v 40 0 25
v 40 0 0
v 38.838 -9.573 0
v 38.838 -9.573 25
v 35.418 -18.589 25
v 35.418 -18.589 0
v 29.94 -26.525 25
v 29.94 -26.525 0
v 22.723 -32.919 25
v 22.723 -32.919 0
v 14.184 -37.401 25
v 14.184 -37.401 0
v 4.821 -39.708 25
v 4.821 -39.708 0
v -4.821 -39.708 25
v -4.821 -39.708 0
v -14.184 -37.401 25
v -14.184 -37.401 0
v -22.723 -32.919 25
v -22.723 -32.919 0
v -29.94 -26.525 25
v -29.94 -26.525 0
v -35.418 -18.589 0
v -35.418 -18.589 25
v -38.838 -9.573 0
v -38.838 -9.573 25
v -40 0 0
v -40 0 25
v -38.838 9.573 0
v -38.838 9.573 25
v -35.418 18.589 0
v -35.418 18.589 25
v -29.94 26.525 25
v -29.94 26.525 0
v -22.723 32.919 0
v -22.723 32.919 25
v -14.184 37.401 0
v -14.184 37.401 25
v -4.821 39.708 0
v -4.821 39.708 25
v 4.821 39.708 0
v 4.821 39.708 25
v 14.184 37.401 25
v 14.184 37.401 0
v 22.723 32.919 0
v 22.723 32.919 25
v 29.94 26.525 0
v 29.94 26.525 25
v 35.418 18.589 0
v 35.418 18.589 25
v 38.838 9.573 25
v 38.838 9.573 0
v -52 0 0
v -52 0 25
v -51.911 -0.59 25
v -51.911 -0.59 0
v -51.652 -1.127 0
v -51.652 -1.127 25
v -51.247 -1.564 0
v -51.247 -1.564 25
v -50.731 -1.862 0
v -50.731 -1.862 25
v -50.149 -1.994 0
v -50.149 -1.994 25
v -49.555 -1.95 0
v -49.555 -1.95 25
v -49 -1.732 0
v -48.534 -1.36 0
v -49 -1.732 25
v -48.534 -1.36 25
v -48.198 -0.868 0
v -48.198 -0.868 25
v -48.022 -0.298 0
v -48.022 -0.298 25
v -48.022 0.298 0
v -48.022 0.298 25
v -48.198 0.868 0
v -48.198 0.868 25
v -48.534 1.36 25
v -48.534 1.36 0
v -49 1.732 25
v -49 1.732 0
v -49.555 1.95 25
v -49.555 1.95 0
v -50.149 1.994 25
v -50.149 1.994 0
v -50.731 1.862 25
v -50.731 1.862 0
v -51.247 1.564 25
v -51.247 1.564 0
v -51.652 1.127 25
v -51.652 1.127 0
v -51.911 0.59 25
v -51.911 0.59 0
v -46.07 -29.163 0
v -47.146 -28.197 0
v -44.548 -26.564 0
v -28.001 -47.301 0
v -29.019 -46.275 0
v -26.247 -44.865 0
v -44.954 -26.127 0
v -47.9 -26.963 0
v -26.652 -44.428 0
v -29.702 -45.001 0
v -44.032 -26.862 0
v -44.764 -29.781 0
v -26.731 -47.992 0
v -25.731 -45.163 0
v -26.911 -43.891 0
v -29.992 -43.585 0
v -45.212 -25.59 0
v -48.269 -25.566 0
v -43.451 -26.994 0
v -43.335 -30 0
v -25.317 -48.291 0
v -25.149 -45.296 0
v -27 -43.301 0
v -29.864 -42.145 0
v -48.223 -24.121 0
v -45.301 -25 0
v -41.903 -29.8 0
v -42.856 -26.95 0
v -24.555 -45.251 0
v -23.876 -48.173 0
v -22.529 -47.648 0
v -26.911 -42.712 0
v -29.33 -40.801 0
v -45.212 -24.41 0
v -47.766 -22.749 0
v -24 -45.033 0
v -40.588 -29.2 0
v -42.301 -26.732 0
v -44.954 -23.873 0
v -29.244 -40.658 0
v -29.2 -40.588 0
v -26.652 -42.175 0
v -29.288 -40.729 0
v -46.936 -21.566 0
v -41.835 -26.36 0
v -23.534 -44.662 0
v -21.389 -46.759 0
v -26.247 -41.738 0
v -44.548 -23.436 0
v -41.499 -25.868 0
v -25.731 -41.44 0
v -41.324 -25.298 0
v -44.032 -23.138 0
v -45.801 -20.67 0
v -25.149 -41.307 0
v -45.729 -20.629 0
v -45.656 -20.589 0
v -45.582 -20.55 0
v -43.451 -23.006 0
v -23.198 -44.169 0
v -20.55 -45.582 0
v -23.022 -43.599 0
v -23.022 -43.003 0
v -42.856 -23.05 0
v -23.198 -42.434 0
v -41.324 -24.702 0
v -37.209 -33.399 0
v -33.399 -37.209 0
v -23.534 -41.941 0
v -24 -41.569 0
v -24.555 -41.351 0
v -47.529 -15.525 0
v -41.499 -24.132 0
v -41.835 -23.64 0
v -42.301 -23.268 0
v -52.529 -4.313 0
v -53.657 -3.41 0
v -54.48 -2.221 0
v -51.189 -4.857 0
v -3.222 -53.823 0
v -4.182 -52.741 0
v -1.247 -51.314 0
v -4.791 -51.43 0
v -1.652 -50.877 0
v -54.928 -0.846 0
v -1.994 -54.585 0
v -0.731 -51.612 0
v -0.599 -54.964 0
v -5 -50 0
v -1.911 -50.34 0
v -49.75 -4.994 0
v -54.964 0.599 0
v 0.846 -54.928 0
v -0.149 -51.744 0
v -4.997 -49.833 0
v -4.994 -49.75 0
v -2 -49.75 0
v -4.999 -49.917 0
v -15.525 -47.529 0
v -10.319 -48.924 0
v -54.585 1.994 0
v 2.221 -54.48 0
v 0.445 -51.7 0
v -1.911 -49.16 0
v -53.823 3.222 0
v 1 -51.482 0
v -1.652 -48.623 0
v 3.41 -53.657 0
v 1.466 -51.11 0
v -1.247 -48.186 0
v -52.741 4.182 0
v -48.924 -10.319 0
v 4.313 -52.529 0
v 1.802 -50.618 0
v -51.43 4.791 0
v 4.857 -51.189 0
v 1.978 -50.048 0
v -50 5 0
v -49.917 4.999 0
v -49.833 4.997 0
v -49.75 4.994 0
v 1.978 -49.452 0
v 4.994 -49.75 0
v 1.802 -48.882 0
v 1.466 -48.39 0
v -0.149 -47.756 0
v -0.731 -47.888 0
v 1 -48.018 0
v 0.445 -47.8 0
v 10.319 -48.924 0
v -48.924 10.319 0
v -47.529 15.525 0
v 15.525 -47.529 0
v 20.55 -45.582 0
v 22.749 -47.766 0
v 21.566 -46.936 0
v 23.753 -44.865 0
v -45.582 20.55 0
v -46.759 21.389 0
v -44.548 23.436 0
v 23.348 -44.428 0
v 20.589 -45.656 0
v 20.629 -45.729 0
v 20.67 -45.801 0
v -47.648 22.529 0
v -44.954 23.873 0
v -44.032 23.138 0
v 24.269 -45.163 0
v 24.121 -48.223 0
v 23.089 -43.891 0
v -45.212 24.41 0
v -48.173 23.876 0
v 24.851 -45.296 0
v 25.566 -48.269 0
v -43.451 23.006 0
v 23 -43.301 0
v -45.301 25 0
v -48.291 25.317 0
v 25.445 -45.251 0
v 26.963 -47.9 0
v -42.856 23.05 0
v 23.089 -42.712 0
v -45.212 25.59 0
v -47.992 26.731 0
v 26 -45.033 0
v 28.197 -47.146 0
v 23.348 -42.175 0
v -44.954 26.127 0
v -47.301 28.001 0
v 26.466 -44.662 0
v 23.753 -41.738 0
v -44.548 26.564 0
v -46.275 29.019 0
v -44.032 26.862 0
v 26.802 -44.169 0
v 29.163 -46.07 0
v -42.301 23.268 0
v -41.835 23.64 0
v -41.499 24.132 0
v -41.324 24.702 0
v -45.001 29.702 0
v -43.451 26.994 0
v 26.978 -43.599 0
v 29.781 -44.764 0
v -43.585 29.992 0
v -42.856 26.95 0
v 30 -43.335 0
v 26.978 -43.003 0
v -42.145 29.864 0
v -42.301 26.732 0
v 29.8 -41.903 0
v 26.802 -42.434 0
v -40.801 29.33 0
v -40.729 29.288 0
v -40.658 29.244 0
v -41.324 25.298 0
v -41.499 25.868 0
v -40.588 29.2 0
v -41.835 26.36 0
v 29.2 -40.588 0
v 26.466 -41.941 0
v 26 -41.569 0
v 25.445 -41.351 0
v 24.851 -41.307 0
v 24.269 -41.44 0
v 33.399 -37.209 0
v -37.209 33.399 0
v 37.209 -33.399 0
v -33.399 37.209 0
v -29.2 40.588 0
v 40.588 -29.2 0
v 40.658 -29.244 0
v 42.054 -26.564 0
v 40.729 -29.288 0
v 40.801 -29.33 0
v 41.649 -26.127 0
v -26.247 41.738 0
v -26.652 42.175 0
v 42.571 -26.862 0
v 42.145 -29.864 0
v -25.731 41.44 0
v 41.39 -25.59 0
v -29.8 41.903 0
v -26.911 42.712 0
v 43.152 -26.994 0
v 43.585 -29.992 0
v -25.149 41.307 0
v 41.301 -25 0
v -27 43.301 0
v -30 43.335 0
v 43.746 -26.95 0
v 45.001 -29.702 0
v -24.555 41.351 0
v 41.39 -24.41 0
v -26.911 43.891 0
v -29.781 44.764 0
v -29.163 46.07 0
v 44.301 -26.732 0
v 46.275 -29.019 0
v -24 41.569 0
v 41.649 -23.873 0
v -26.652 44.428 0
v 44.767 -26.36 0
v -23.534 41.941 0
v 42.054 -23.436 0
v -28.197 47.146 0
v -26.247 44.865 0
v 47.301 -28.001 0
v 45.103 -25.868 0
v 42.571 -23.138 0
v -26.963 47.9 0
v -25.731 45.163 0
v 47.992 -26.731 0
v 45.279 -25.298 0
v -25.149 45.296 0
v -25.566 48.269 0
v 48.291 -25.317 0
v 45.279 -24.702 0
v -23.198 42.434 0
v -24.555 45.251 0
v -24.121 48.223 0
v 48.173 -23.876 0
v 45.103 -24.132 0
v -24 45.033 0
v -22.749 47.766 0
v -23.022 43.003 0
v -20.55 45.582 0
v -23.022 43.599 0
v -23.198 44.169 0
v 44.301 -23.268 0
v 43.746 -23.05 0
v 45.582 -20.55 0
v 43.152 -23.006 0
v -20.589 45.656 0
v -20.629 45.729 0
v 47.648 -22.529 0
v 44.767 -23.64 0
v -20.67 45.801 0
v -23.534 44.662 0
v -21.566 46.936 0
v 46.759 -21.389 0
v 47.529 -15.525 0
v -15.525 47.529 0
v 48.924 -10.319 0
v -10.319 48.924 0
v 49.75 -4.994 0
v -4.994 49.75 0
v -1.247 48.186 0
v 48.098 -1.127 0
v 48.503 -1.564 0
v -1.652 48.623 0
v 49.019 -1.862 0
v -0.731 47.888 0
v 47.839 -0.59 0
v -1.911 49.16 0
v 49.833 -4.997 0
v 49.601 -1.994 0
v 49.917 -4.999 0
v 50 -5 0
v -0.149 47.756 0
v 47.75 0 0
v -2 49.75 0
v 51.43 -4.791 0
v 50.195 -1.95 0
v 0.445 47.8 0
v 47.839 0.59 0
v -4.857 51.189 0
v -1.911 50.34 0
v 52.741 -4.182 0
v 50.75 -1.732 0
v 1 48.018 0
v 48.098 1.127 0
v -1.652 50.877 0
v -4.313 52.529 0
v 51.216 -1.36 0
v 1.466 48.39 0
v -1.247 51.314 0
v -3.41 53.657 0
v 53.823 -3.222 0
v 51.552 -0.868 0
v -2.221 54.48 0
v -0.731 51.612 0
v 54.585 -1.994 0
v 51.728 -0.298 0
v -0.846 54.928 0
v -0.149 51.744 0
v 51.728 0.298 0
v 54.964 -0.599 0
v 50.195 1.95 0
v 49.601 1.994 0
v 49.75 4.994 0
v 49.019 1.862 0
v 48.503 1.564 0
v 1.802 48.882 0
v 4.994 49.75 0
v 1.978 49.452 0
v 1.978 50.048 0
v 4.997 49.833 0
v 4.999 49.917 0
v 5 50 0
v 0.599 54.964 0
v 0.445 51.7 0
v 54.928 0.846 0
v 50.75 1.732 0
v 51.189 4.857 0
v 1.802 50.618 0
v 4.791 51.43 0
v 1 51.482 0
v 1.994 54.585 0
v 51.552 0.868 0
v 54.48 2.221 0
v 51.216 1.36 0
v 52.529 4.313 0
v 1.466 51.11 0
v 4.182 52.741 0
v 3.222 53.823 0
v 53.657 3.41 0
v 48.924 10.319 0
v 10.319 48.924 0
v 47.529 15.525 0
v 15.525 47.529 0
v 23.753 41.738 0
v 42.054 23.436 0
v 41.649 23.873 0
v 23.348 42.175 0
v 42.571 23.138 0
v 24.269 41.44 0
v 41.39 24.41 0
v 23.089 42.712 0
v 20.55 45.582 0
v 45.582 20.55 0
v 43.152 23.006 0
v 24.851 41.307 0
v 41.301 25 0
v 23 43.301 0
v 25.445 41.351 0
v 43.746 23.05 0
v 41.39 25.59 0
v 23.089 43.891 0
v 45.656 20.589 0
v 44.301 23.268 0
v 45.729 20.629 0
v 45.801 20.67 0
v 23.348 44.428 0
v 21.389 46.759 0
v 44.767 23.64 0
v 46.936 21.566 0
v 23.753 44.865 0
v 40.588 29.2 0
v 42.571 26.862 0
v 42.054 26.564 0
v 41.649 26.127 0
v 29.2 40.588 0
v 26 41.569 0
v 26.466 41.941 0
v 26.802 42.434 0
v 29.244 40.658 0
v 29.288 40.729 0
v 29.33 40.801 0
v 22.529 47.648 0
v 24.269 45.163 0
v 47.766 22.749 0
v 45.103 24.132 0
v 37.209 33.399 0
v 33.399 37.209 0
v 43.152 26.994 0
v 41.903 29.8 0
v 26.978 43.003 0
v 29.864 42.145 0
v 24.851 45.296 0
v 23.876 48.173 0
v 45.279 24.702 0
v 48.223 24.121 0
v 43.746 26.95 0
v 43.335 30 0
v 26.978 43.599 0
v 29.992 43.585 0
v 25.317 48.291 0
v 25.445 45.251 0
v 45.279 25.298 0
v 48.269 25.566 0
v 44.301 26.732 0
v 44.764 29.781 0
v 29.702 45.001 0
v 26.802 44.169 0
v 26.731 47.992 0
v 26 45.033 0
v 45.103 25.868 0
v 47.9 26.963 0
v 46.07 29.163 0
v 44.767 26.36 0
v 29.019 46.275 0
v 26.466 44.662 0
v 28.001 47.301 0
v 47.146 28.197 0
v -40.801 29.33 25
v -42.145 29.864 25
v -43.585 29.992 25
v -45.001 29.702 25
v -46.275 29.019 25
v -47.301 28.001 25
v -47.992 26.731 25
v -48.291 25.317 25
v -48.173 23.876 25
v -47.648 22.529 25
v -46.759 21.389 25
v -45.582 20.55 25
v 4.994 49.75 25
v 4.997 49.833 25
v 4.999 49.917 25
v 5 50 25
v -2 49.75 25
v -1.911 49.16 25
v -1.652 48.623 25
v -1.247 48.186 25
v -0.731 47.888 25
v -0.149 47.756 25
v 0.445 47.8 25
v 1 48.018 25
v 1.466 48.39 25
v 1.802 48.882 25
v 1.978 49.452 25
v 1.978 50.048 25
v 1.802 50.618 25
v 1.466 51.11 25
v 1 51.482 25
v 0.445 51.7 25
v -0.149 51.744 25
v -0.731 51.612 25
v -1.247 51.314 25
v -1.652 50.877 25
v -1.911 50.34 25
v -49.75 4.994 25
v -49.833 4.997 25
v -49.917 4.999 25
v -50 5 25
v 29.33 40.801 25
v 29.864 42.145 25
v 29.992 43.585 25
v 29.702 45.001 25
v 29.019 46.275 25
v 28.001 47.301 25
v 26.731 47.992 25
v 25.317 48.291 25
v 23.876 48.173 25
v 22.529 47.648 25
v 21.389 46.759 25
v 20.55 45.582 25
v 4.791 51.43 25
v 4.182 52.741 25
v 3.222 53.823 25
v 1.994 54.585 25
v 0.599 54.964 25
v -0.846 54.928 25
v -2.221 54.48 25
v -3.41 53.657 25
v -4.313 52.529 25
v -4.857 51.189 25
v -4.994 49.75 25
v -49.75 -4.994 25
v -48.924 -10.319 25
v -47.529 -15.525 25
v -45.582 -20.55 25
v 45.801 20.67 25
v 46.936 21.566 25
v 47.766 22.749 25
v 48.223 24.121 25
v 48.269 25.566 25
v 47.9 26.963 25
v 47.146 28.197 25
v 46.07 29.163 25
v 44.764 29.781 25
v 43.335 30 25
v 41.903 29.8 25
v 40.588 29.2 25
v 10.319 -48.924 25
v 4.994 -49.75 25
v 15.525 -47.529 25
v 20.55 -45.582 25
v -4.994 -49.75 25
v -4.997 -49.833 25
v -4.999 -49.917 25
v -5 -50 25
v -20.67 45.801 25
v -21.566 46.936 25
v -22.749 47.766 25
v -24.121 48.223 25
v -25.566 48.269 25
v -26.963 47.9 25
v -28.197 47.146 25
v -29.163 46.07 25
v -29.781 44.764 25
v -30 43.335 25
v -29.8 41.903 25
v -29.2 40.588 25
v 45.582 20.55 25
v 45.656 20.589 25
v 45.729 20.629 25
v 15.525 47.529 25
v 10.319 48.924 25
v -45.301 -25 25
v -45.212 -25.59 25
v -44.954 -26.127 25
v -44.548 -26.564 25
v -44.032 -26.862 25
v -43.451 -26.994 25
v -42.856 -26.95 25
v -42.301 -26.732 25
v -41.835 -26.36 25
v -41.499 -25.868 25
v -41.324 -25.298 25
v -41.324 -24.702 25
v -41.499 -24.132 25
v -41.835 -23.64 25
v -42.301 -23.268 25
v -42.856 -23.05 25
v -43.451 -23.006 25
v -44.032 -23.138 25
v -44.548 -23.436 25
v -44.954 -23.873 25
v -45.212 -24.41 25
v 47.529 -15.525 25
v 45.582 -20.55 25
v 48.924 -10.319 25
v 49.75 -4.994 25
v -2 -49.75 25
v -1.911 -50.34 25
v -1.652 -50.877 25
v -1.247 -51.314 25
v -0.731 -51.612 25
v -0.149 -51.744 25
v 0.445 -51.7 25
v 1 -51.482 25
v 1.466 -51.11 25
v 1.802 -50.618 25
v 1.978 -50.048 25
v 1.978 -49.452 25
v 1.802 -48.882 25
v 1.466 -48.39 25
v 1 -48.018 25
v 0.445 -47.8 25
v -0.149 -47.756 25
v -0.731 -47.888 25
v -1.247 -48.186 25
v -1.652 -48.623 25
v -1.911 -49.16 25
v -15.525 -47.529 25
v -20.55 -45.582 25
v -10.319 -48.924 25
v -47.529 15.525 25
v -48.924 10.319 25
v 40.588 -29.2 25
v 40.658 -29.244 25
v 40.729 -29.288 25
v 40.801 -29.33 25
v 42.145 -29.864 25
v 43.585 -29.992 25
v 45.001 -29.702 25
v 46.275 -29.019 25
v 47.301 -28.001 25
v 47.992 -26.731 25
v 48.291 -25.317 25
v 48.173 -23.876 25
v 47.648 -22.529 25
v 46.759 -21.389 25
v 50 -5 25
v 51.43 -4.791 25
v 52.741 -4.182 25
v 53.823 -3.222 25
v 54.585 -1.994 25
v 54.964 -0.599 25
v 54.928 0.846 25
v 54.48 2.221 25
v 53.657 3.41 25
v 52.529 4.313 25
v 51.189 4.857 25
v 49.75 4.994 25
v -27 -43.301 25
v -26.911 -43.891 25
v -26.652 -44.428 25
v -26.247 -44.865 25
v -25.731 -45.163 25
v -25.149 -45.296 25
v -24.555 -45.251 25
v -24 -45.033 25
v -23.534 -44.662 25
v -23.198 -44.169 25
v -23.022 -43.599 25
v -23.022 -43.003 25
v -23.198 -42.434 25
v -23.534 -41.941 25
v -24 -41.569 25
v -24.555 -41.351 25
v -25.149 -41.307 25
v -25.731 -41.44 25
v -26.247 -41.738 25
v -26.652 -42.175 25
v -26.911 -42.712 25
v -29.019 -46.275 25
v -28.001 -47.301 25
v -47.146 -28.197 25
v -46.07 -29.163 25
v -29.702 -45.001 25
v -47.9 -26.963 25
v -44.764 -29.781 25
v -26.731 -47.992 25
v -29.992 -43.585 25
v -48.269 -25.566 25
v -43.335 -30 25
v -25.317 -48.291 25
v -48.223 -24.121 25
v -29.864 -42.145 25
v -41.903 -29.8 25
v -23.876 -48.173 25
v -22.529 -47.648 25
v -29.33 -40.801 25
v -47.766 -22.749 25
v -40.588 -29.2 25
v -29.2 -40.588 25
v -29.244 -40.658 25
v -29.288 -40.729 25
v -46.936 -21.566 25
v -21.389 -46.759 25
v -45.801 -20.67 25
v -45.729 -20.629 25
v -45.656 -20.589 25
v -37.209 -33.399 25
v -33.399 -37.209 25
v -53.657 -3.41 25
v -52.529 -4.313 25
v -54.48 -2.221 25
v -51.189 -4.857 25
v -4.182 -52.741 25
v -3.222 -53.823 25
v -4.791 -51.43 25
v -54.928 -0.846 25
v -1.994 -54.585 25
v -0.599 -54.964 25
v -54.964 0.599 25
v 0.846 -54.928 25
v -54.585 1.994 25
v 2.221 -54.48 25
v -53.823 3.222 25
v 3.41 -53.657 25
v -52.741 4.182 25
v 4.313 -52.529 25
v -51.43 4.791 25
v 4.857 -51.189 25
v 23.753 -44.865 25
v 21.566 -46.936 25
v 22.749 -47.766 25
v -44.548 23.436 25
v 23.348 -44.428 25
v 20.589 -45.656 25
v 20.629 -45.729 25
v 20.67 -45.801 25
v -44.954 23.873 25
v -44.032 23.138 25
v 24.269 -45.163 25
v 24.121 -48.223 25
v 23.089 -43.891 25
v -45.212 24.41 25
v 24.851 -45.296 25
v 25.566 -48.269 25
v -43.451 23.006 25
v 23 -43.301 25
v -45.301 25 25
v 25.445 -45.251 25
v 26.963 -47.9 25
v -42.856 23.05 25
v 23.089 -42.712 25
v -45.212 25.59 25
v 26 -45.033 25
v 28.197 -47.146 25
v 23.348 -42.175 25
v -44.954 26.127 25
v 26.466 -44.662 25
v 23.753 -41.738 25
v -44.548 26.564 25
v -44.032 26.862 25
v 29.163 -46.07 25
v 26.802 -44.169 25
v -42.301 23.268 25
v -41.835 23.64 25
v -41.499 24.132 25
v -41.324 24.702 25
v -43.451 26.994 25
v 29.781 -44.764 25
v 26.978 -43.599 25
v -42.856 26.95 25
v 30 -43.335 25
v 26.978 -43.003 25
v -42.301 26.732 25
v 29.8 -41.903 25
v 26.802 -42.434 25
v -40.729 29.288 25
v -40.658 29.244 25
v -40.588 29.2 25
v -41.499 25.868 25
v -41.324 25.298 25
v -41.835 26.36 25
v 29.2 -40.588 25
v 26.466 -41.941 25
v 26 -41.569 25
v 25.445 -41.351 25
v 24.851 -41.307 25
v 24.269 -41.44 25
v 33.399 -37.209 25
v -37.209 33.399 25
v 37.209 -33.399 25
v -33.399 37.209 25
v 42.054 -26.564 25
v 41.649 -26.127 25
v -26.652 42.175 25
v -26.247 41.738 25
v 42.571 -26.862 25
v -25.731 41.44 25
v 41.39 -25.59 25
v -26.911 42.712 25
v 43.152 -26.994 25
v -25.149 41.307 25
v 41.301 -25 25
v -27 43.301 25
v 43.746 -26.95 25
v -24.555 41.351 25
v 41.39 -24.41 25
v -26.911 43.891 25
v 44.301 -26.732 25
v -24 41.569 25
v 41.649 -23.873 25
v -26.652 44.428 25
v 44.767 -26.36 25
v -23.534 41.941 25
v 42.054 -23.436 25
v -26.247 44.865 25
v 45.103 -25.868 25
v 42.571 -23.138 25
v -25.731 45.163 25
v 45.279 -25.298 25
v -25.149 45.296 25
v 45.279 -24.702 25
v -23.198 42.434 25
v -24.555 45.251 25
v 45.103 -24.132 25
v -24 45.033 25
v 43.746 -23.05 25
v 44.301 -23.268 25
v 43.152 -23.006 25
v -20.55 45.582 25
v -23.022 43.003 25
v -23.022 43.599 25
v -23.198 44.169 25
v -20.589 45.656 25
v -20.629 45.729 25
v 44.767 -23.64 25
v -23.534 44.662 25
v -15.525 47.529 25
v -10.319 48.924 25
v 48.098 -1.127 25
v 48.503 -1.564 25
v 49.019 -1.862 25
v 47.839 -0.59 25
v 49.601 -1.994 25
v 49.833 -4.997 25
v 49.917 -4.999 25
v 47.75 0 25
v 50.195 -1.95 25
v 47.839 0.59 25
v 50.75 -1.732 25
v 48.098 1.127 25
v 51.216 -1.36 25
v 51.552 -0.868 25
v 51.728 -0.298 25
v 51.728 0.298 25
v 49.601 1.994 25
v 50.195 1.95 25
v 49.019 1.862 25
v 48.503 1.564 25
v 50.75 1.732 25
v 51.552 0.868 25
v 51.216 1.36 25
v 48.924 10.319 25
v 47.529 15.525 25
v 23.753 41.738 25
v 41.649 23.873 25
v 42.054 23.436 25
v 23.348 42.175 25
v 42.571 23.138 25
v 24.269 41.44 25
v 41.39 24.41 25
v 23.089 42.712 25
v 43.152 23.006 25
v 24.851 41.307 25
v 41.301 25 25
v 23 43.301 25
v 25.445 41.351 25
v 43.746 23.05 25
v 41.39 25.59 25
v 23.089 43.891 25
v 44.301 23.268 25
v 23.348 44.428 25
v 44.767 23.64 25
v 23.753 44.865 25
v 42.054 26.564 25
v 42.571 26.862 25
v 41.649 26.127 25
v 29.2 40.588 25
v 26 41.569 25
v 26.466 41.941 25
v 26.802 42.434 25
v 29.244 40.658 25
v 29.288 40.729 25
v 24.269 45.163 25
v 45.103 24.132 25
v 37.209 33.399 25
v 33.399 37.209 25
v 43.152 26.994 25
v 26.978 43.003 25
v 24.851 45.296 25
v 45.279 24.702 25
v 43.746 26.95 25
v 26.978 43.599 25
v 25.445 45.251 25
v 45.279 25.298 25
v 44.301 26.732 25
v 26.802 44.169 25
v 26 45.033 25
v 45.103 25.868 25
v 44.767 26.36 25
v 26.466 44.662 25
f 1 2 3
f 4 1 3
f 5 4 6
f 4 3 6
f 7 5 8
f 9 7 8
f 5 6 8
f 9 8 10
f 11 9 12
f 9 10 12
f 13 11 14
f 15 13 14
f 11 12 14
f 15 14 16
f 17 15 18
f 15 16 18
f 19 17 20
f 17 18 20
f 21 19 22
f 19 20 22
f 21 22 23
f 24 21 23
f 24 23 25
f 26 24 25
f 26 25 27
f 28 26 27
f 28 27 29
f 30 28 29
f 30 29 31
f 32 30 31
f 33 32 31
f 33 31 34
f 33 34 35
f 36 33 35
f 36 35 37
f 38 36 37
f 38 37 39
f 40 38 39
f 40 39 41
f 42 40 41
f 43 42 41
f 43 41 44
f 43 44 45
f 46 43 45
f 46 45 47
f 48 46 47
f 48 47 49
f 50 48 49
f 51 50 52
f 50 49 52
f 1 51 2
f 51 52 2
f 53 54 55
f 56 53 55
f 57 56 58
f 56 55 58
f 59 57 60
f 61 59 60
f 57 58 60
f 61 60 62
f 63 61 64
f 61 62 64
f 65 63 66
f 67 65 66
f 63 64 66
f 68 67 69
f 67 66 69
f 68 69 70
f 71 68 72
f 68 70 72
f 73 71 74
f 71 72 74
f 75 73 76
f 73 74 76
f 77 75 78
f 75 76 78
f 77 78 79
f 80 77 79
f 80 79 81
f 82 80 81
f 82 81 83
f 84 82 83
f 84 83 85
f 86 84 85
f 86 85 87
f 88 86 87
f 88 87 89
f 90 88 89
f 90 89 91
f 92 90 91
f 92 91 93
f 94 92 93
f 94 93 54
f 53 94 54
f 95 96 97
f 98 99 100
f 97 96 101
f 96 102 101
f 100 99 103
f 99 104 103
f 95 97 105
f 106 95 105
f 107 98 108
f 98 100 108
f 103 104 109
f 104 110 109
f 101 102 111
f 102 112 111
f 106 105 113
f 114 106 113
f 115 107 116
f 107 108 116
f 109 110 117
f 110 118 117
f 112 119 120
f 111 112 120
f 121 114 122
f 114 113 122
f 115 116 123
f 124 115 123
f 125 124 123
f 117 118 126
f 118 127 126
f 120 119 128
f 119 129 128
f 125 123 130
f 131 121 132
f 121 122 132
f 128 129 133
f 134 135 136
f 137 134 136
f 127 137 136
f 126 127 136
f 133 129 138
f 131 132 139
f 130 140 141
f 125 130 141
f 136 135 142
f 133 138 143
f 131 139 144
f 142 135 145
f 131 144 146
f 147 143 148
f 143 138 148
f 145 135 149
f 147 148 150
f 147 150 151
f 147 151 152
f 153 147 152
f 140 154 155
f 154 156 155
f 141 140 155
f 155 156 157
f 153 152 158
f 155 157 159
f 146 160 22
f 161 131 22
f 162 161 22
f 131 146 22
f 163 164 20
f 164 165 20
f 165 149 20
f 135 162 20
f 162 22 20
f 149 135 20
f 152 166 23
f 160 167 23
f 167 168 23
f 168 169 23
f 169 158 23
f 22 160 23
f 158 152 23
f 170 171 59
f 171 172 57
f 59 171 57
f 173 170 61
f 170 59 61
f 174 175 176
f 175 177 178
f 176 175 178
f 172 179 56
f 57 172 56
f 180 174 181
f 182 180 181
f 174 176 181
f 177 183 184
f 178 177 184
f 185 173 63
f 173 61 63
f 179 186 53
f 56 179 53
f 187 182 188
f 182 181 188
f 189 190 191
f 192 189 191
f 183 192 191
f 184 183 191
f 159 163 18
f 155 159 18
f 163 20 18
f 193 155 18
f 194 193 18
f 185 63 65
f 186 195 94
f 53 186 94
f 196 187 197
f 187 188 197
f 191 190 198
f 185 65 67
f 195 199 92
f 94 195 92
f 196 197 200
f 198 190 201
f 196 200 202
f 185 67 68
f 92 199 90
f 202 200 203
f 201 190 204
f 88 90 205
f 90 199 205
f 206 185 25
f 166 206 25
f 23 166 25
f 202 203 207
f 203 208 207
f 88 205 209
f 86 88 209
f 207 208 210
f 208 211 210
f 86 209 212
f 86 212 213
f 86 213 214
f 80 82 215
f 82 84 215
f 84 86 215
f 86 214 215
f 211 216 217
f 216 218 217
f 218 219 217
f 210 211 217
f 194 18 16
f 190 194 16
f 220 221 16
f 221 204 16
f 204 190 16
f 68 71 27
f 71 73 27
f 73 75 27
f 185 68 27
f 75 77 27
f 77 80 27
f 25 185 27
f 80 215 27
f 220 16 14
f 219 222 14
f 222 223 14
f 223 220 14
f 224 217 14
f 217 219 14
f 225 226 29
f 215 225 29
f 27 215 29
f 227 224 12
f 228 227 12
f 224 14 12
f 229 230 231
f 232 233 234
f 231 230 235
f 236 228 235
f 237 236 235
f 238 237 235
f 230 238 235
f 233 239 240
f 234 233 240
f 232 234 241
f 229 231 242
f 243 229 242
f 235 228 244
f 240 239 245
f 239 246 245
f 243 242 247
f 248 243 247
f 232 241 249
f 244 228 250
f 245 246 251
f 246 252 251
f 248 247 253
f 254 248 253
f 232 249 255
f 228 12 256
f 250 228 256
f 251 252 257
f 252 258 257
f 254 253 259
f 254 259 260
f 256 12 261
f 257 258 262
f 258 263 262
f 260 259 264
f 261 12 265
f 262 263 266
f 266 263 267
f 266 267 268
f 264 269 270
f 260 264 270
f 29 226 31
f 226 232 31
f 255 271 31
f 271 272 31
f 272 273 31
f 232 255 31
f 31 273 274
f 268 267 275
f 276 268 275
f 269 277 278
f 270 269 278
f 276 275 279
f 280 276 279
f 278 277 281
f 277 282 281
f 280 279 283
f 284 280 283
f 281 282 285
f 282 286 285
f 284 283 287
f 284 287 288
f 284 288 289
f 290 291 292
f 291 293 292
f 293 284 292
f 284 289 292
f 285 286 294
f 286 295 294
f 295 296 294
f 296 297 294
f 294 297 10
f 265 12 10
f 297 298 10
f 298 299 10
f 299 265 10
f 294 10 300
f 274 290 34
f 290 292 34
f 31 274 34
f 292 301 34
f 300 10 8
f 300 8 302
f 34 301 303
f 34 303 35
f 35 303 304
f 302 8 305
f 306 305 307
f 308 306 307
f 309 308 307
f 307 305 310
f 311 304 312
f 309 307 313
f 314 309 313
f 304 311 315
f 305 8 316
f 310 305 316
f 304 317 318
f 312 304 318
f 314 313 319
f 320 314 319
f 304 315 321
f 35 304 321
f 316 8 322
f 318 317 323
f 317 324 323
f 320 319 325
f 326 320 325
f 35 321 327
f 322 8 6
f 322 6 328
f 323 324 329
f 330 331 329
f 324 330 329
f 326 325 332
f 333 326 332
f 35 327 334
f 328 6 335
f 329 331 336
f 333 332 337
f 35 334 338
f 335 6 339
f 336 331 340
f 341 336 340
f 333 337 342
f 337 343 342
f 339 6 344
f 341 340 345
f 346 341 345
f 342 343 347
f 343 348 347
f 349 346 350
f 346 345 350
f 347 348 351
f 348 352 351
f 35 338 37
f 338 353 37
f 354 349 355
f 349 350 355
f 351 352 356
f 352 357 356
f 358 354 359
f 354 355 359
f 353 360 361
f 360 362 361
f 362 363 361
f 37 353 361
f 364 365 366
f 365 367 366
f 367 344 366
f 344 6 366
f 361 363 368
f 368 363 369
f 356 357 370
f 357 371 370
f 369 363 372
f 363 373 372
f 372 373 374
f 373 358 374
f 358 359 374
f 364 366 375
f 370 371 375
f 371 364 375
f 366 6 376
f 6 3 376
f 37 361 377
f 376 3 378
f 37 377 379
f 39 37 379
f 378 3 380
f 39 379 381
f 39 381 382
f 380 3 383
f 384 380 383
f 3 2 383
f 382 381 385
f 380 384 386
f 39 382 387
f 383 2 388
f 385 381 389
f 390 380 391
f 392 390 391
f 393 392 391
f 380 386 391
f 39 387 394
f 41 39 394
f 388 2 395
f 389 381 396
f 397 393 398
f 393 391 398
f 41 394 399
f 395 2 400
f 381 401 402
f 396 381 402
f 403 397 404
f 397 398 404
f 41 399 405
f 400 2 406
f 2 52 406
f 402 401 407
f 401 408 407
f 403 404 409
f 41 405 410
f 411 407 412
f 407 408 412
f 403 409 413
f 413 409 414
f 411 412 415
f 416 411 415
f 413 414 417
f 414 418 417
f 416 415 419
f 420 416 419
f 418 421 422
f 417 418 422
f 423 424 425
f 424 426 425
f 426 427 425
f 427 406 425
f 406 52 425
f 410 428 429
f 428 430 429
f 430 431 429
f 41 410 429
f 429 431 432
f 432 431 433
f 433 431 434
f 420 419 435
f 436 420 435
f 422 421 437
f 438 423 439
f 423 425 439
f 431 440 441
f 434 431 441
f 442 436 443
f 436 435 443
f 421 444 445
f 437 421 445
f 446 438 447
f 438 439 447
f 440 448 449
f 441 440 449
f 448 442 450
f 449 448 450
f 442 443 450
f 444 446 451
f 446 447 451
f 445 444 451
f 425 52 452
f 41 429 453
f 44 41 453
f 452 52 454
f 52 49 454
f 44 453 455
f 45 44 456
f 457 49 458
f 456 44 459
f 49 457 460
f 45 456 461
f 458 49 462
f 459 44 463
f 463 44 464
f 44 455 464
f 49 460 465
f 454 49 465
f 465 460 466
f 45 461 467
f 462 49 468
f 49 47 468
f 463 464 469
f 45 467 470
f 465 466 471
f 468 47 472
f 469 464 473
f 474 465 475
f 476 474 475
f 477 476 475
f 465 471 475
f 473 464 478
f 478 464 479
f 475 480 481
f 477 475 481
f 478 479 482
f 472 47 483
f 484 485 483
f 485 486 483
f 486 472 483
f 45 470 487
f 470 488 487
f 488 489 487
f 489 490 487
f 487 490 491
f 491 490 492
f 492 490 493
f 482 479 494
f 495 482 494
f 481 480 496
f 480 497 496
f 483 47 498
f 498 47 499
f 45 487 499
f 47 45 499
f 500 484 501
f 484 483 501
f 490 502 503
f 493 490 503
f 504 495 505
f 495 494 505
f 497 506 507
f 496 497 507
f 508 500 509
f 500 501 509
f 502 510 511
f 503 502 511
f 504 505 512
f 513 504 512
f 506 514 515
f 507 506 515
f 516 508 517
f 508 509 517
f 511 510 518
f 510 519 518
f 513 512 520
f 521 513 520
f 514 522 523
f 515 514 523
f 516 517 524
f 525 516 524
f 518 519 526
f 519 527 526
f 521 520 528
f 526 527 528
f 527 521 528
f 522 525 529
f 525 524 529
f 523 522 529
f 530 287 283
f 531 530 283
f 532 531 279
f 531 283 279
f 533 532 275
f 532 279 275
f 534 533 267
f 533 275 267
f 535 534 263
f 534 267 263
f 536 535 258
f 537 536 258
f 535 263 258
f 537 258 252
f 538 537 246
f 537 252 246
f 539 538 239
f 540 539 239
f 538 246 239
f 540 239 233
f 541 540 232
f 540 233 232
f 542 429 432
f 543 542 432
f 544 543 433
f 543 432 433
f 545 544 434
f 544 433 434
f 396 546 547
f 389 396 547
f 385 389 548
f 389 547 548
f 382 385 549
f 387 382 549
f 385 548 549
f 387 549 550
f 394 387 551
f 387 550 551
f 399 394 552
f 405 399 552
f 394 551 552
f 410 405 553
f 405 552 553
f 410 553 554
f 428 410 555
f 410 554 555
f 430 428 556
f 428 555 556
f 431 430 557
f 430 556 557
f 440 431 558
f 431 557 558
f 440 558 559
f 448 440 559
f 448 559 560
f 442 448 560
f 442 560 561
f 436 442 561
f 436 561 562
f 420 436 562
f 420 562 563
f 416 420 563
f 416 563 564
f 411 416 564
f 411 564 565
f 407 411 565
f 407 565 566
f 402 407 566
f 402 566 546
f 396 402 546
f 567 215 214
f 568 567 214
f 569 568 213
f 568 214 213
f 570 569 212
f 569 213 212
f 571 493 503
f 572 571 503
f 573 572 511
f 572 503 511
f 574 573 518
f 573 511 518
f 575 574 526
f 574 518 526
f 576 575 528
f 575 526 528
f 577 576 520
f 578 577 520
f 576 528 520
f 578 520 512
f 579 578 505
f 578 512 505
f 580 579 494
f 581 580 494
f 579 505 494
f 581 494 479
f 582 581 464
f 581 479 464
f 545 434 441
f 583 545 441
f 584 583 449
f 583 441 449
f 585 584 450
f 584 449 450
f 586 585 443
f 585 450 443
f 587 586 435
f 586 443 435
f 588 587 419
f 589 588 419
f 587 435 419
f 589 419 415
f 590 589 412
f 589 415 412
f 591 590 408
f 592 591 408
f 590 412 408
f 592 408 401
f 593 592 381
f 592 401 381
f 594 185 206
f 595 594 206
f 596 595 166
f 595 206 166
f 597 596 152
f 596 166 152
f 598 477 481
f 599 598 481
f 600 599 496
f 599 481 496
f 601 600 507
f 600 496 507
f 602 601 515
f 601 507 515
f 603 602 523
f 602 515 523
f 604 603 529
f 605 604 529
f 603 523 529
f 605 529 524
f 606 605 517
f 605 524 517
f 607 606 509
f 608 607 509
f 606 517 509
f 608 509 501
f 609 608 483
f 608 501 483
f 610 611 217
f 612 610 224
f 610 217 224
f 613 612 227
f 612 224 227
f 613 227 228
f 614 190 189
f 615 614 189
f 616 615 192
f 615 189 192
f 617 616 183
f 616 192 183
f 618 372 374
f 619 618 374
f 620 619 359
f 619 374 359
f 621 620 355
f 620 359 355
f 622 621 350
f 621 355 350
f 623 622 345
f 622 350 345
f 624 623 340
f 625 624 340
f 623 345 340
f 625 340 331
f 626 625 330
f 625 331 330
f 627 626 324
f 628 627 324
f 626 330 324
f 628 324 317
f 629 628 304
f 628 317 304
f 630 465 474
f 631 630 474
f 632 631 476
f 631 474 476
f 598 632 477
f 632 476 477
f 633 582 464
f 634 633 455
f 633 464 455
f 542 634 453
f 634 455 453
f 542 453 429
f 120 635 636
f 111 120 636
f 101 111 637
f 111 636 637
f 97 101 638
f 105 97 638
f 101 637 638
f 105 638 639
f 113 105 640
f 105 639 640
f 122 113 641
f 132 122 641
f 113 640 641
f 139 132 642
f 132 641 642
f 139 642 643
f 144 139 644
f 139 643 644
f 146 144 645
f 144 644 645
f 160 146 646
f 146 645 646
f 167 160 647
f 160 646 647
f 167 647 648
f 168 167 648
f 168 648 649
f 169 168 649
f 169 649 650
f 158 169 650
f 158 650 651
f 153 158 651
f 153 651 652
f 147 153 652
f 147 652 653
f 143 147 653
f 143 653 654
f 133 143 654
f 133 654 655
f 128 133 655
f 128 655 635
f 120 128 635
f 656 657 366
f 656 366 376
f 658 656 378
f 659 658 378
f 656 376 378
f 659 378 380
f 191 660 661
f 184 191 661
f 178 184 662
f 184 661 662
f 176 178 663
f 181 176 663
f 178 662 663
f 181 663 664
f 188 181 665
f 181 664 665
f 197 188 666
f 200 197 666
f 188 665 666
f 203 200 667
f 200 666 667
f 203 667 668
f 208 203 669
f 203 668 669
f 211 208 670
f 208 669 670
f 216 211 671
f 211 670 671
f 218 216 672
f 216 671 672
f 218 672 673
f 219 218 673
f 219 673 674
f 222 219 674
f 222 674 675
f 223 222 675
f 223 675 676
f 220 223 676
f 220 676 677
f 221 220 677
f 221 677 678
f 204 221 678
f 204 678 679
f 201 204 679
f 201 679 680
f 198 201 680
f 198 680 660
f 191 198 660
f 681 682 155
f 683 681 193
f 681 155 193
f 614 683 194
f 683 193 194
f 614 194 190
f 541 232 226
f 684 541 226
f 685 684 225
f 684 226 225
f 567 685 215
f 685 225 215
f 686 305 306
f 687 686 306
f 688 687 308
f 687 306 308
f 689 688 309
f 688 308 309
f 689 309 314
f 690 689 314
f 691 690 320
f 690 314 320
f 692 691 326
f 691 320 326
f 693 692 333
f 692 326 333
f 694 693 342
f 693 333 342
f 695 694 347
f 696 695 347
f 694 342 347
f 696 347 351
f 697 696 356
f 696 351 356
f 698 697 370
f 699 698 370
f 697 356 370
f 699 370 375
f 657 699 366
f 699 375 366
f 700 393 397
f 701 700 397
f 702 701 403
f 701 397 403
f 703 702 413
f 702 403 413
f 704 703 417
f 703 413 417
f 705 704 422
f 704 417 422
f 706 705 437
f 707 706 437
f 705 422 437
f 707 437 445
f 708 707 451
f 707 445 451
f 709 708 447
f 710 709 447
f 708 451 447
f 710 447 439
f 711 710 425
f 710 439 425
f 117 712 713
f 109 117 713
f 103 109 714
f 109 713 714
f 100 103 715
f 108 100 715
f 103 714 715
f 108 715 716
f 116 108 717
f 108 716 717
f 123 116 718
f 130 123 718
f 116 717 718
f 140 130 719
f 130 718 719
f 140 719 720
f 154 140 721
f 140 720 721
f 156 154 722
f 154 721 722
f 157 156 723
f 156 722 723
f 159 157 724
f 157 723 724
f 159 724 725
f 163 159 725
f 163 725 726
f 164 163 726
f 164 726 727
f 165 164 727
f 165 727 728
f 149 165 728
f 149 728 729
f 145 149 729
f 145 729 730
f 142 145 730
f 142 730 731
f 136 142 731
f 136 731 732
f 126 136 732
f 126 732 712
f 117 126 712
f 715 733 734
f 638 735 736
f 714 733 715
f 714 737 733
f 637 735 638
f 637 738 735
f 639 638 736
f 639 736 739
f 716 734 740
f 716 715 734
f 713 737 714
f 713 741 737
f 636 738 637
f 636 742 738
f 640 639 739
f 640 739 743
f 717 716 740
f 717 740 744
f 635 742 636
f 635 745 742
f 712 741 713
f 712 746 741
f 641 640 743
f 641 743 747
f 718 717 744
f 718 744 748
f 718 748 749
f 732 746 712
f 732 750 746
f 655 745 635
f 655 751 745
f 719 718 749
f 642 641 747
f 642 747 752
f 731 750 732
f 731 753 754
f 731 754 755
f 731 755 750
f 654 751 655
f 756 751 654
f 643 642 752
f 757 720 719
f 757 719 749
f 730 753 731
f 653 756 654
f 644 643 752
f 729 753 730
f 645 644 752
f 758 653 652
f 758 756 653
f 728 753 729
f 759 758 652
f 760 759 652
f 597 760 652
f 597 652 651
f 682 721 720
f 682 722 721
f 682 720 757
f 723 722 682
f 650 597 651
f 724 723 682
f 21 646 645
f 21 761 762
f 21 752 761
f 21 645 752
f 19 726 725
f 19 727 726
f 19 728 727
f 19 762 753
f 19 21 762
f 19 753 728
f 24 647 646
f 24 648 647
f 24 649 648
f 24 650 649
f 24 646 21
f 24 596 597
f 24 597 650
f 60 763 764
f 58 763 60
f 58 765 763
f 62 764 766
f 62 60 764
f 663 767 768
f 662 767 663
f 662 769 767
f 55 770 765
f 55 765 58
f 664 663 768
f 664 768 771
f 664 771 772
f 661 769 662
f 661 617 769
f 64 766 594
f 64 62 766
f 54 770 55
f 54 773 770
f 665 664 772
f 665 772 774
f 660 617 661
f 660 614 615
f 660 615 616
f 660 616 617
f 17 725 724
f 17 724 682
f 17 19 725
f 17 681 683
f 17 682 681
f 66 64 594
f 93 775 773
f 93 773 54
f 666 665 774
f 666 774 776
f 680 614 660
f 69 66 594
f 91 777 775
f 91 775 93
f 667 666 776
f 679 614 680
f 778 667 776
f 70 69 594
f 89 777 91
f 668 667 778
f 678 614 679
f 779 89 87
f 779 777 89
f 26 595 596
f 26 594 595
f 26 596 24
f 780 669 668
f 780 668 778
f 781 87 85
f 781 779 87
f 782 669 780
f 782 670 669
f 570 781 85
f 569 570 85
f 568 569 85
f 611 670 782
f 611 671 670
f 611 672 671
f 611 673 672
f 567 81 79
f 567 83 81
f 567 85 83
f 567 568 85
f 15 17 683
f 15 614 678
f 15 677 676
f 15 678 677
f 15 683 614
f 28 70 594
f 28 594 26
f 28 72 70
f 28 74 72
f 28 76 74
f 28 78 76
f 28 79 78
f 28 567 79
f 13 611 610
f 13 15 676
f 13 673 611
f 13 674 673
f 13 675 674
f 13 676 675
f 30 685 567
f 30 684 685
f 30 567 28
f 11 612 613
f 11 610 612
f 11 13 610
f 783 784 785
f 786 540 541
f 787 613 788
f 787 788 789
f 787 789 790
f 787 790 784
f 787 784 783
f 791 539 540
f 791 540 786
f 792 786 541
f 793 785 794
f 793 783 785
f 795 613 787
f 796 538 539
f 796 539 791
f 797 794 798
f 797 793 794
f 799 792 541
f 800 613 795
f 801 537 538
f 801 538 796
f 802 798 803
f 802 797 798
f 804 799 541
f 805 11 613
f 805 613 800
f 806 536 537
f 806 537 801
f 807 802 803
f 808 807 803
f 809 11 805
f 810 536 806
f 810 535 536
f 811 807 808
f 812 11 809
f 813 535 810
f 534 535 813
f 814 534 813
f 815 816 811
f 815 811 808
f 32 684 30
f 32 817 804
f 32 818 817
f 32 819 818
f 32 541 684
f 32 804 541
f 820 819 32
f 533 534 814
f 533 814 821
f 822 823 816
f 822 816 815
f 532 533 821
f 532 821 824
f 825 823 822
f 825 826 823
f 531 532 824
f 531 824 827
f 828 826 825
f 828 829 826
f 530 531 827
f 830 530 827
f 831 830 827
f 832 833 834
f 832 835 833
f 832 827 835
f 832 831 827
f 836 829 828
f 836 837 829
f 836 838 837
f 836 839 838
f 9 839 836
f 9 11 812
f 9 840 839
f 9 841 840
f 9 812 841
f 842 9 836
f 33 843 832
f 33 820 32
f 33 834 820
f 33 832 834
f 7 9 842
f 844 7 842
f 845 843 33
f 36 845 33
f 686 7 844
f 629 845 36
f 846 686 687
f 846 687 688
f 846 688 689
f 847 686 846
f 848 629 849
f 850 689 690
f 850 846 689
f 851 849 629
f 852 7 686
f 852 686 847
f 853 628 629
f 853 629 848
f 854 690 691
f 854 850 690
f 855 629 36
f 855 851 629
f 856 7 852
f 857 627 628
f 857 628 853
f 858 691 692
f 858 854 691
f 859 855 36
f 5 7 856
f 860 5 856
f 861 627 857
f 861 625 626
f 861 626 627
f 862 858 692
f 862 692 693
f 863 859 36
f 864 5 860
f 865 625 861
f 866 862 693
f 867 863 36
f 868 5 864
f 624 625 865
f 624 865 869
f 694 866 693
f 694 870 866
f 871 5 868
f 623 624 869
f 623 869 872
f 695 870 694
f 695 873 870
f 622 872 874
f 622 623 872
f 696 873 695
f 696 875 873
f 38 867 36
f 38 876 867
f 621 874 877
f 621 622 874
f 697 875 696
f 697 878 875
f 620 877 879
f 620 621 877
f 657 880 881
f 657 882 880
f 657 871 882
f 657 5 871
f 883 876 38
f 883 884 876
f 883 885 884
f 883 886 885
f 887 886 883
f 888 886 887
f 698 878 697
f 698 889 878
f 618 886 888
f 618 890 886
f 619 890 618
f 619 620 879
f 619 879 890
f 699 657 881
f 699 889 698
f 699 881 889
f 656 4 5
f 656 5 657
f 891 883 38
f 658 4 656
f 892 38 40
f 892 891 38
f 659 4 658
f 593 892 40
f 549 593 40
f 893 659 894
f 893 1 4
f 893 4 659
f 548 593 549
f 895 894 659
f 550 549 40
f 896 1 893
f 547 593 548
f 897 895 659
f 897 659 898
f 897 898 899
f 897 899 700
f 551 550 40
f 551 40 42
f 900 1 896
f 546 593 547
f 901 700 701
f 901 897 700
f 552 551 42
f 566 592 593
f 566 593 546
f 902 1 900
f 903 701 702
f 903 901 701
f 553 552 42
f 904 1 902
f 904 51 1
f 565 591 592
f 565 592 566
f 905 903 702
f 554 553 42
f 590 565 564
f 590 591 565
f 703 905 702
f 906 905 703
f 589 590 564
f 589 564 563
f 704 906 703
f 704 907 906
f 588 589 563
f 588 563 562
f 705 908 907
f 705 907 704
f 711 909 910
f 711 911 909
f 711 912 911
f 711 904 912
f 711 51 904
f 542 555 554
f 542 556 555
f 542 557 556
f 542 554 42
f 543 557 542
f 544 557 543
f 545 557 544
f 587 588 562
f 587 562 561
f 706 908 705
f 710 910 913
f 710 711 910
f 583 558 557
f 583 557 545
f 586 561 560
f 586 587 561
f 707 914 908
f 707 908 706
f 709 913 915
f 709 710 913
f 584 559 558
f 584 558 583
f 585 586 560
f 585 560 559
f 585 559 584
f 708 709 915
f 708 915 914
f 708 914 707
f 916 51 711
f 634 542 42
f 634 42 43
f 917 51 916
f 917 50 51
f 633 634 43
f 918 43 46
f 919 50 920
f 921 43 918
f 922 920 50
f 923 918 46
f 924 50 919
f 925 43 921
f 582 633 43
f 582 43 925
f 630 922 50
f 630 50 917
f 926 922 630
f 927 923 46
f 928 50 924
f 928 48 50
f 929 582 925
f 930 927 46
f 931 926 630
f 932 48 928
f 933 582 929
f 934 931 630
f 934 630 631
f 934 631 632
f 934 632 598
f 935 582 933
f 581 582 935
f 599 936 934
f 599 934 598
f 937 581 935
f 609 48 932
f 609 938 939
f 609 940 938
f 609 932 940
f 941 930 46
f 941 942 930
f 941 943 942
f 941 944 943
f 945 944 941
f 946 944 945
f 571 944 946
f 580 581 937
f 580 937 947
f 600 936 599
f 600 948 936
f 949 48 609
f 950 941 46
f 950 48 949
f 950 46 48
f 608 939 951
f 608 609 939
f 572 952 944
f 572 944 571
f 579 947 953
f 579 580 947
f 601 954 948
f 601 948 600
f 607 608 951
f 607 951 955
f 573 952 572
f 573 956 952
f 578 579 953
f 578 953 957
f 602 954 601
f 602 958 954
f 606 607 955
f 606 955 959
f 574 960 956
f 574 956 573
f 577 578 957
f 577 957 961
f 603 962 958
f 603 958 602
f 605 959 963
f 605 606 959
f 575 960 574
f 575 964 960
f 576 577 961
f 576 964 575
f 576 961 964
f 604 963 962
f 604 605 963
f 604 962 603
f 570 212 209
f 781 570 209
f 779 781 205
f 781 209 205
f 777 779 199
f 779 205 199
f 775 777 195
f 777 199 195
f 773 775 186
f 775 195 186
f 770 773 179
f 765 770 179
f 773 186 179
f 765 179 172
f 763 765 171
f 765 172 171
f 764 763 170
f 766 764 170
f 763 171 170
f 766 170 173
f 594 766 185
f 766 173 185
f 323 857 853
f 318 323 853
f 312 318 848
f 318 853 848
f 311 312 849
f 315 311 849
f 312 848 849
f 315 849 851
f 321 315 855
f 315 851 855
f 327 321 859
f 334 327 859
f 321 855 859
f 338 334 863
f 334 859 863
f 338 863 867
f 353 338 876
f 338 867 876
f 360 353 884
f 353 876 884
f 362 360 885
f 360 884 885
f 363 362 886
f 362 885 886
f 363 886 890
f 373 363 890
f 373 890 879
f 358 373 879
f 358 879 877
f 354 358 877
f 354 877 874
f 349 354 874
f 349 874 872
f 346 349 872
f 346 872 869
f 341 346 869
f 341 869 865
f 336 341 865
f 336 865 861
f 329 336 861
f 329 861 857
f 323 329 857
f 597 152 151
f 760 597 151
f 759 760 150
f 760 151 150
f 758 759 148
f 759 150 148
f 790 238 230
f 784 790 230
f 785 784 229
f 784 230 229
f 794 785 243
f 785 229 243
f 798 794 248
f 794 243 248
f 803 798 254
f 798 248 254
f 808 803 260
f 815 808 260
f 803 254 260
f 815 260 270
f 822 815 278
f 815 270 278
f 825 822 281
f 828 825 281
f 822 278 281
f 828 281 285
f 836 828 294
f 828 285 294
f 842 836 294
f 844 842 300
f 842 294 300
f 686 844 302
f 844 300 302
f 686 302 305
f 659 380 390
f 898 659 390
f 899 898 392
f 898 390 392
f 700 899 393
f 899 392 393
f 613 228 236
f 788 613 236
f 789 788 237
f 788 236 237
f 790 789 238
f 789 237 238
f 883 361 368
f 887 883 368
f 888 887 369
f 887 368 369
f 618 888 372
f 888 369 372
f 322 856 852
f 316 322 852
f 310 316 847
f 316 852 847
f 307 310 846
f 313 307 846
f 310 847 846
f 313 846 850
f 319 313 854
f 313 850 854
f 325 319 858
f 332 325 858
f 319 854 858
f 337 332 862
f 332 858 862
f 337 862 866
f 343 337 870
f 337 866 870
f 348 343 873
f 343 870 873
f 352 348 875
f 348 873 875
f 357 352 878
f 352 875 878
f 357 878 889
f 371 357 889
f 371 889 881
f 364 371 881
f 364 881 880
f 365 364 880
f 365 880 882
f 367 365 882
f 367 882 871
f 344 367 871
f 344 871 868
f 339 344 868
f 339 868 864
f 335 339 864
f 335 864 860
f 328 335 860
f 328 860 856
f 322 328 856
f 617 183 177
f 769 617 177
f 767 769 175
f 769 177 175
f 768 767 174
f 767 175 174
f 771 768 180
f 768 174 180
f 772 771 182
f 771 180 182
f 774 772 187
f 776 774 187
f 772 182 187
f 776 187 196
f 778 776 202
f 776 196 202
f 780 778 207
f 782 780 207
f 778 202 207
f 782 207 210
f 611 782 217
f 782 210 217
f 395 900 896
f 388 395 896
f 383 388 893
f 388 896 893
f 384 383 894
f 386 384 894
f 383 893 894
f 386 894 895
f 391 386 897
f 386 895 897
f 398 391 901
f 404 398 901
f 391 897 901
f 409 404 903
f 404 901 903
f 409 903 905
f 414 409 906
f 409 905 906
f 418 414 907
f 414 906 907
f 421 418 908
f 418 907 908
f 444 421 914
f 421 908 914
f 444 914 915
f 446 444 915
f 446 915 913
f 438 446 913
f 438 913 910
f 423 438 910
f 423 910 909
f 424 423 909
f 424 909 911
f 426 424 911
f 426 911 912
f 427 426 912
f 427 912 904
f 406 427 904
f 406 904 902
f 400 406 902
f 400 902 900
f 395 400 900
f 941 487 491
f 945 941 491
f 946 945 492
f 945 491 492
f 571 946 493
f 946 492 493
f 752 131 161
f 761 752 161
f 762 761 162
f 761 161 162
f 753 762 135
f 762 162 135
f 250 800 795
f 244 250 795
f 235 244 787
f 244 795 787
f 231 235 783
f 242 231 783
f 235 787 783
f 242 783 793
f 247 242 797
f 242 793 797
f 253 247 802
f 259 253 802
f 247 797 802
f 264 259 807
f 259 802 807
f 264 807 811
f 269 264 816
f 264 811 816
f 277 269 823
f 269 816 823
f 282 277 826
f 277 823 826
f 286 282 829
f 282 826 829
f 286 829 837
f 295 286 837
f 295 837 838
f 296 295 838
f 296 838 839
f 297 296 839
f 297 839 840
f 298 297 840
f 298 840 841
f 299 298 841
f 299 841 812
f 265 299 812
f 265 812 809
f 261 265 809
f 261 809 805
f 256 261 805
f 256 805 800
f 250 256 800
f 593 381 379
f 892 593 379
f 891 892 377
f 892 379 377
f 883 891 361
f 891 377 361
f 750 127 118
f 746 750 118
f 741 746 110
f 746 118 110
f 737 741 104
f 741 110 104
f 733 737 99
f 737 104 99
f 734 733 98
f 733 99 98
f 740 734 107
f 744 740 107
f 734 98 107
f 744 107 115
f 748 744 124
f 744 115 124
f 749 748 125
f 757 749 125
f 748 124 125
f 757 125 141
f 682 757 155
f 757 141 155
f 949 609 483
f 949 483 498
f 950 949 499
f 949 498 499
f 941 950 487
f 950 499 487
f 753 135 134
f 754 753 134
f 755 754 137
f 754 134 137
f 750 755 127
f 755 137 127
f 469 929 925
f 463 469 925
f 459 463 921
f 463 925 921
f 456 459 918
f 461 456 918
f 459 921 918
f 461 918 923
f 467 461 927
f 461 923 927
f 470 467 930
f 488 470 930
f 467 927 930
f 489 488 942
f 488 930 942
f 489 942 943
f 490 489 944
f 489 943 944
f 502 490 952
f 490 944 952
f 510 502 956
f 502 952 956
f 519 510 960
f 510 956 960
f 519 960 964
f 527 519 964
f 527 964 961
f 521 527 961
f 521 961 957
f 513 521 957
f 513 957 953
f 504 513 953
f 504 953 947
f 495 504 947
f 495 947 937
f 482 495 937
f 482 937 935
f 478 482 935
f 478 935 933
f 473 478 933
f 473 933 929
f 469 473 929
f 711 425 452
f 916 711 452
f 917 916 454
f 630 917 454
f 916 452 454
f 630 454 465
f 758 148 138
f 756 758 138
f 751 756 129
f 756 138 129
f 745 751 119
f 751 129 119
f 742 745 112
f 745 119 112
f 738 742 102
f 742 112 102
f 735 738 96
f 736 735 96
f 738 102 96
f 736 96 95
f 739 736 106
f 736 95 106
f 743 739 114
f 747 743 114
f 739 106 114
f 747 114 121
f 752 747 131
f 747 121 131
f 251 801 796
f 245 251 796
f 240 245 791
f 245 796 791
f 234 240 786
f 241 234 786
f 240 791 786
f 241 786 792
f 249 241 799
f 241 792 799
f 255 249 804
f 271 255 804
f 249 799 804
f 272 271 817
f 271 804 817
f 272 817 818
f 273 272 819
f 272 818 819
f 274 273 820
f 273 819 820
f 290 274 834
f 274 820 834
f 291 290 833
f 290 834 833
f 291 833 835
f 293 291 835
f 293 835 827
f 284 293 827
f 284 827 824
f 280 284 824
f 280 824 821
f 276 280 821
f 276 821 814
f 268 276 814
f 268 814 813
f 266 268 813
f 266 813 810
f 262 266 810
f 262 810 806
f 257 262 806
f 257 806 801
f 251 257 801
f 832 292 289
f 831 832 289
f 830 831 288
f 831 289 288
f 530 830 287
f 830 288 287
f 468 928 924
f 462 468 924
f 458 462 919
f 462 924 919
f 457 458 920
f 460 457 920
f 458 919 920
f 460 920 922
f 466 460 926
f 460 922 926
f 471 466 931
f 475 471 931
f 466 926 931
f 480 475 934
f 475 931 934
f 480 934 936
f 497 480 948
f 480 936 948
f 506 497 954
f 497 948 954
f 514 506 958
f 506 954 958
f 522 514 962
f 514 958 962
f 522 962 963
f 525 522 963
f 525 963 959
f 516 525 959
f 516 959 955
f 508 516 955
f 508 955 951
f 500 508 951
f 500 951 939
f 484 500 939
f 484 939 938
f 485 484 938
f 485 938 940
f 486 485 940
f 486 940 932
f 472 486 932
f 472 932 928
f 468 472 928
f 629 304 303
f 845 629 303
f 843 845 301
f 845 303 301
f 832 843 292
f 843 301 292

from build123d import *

# Parameters (mm, degrees)
F1_DEPTH = 25
F2_COUNT = 12
F5_D     = 4
F6_R     = 40
F7_DEPTH = 25.001


with BuildPart() as f1:
    # F0 (on Top) → F1 (new body)
    with BuildSketch(Plane.XY):
        with BuildLine():
            ThreePointArc((-4.9937460889, 49.75), (-33.5433502766, -37.0788841825), (50, 0))
            ThreePointArc((50, 0), (37.0788841825, 33.5433502766), (4.9937460889, 49.75))
            ThreePointArc((4.9937460889, 49.75), (0, 45), (-4.9937460889, 49.75))
        make_face()
        with BuildLine():
            ThreePointArc((-4.9937460889, 49.75), (0, 45), (4.9937460889, 49.75))
            ThreePointArc((4.9937460889, 49.75), (0, 50), (-4.9937460889, 49.75))
        make_face()
        with BuildLine():
            ThreePointArc((-4.9937460889, 49.75), (0, 50), (4.9937460889, 49.75))
            ThreePointArc((4.9937460889, 49.75), (4.9984362777, 49.8749608947), (5, 50))
            ThreePointArc((5, 50), (-0.1250391053, 54.9984362777), (-4.9937460889, 49.75))
        make_face()
    extrude(amount=F1_DEPTH)


with BuildPart() as f2_1:
    # F2: instance of F1
    add(f1.part.rotate(Axis((0, 0, 0), (0, 0, -1)), 1 * 360 / F2_COUNT))


with BuildPart() as f2_2:
    # F2: instance of F1
    add(f1.part.rotate(Axis((0, 0, 0), (0, 0, -1)), 2 * 360 / F2_COUNT))


with BuildPart() as f2_3:
    # F2: instance of F1
    add(f1.part.rotate(Axis((0, 0, 0), (0, 0, -1)), 3 * 360 / F2_COUNT))


with BuildPart() as f2_4:
    # F2: instance of F1
    add(f1.part.rotate(Axis((0, 0, 0), (0, 0, -1)), 4 * 360 / F2_COUNT))


with BuildPart() as f2_5:
    # F2: instance of F1
    add(f1.part.rotate(Axis((0, 0, 0), (0, 0, -1)), 5 * 360 / F2_COUNT))


with BuildPart() as f2_6:
    # F2: instance of F1
    add(f1.part.rotate(Axis((0, 0, 0), (0, 0, -1)), 6 * 360 / F2_COUNT))


with BuildPart() as f2_7:
    # F2: instance of F1
    add(f1.part.rotate(Axis((0, 0, 0), (0, 0, -1)), 7 * 360 / F2_COUNT))


with BuildPart() as f2_8:
    # F2: instance of F1
    add(f1.part.rotate(Axis((0, 0, 0), (0, 0, -1)), 8 * 360 / F2_COUNT))


with BuildPart() as f2_9:
    # F2: instance of F1
    add(f1.part.rotate(Axis((0, 0, 0), (0, 0, -1)), 9 * 360 / F2_COUNT))


with BuildPart() as f2_10:
    # F2: instance of F1
    add(f1.part.rotate(Axis((0, 0, 0), (0, 0, -1)), 10 * 360 / F2_COUNT))


with BuildPart() as f2_11:
    # F2: instance of F1
    add(f1.part.rotate(Axis((0, 0, 0), (0, 0, -1)), 11 * 360 / F2_COUNT))


with BuildPart() as f1_1:
    add(f1.part)

    # F3: union F2_5, F2_6, F2_1, F2_2, F2_3, F2_4, F2_11, F2_10, F2_7, F2_8, F2_9
    add(f2_5.part)
    add(f2_6.part)
    add(f2_1.part)
    add(f2_2.part)
    add(f2_3.part)
    add(f2_4.part)
    add(f2_11.part)
    add(f2_10.part)
    add(f2_7.part)
    add(f2_8.part)
    add(f2_9.part)

    # F5 (through all)
    with Locations(Plane(origin=(0, 0, 0), x_dir=(1, 0, 0), z_dir=(0, 0, -1))):
        with Locations((43.3012701892, -25), (25, -43.3012701892), (0, -49.75), (-25, -43.3012701892), (-43.3012701892, -25), (-50, 0), (-43.3012701892, 25), (-25, 43.3012701892), (0, 49.75), (25, 43.3012701892), (43.3012701892, 25), (49.75, 0)):
            Hole(F5_D / 2)

    # F6 (on face) → F7 (cut, through all)
    with BuildSketch(Plane(origin=(0, 0, 0), x_dir=(1, 0, 0), z_dir=(0, 0, -1))):
        Circle(F6_R)
    extrude(amount=-F7_DEPTH, mode=Mode.SUBTRACT)


solid = f1_1.part
